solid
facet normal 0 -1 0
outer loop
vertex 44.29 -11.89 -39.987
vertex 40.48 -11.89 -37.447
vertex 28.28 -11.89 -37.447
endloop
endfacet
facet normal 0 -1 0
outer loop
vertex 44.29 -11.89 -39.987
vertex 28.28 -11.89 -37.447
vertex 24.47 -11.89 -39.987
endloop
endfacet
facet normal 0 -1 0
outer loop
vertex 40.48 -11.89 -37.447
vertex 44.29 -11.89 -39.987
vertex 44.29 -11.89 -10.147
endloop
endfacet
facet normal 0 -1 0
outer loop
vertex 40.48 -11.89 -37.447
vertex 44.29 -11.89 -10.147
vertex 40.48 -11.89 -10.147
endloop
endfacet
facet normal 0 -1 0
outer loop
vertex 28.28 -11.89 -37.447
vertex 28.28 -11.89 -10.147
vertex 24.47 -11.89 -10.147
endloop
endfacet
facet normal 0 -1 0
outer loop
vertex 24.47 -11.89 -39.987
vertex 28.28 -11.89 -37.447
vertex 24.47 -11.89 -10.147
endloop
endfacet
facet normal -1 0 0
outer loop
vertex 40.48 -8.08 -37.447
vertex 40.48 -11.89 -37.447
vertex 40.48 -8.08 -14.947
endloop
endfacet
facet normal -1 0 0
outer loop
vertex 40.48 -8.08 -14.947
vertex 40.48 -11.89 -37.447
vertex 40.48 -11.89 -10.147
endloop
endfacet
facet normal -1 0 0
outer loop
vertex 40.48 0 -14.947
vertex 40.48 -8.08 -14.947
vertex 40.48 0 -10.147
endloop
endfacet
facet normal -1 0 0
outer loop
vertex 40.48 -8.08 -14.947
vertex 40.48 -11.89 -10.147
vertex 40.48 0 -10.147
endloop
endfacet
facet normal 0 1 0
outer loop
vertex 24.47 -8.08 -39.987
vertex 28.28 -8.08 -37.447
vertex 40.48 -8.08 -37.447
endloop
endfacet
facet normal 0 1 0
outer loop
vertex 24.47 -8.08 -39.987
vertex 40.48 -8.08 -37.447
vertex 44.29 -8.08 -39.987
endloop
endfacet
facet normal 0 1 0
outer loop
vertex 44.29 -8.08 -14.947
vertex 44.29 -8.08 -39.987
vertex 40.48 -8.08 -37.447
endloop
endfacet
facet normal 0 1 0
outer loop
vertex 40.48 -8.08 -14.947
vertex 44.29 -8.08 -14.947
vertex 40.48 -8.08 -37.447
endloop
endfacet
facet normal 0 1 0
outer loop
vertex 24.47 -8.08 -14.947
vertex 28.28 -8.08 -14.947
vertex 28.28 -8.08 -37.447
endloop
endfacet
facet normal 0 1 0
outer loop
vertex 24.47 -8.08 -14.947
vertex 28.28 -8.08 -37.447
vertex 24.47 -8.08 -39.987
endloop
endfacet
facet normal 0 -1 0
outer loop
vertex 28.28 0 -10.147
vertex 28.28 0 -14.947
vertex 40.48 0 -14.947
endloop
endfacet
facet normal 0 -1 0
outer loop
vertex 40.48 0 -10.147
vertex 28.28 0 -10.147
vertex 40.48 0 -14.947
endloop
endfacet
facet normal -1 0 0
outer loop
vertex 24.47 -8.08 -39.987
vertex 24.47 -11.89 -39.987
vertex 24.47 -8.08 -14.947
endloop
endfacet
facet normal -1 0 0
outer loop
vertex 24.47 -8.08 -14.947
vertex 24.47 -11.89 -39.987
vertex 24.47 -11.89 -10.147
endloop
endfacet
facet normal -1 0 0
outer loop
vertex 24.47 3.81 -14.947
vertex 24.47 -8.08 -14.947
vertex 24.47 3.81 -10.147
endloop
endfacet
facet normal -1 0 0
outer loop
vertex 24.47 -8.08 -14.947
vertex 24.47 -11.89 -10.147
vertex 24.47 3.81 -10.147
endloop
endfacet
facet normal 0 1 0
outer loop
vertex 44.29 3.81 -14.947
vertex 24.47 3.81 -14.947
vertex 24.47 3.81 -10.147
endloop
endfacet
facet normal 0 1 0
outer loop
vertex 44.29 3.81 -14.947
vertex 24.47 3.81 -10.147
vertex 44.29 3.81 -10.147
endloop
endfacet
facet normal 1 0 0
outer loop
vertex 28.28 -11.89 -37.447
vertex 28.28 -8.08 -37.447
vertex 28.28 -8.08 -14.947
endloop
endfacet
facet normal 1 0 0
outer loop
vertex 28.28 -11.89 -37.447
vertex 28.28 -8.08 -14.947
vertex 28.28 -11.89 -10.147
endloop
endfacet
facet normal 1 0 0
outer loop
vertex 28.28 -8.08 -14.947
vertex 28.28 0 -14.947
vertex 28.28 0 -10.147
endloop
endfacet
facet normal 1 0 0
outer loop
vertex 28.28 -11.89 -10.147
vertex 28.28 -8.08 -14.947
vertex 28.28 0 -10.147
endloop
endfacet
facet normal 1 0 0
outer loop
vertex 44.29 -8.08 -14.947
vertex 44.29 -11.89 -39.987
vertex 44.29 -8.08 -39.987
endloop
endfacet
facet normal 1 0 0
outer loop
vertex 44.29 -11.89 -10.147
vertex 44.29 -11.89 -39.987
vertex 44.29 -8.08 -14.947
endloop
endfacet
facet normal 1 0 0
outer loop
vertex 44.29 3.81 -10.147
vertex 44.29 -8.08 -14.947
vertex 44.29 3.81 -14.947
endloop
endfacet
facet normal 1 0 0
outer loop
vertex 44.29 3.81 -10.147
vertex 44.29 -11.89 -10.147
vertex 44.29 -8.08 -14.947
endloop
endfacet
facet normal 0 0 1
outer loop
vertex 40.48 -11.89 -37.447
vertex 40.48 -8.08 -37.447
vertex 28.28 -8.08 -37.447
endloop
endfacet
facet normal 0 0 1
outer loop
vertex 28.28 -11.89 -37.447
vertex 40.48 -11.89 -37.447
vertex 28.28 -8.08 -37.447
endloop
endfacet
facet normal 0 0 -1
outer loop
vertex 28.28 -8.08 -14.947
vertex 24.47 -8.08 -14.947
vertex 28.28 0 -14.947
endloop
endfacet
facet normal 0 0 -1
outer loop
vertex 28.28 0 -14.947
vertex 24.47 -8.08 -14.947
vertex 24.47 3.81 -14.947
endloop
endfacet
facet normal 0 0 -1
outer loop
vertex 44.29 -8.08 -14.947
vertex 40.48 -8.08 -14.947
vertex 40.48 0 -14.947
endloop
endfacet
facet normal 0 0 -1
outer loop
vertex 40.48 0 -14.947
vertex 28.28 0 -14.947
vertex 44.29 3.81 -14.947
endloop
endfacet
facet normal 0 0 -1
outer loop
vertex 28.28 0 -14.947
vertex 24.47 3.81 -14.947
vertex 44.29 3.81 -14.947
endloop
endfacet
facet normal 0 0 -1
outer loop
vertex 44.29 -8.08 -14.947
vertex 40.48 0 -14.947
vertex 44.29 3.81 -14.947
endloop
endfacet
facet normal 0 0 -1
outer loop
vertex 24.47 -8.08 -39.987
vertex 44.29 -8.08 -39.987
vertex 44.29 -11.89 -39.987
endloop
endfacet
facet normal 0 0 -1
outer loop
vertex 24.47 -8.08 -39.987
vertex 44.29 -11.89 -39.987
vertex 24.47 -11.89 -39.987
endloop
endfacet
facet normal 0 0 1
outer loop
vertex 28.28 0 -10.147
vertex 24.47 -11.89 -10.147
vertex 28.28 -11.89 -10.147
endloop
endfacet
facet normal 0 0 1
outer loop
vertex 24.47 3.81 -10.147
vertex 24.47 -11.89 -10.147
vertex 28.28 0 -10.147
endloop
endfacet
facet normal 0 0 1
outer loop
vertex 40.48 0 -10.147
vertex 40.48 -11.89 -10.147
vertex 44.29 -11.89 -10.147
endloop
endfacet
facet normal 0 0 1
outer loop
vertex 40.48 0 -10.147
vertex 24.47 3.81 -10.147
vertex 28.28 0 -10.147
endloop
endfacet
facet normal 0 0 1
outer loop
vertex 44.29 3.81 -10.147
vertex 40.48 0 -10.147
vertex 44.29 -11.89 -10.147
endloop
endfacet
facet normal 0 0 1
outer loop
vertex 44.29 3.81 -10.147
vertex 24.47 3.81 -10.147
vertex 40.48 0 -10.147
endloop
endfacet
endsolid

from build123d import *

# Parameters (mm, degrees)
SKETCH1_W           = 19.82
SKETCH1_H           = 4.8
BOSS_EXTRUDE1_DEPTH = 3.81
SKETCH2_W           = 3.81
SKETCH2_H           = 4.8
BOSS_EXTRUDE2_DEPTH = 11.89
SKETCH3_W           = 3.81
SKETCH3_H           = 3.81
BOSS_EXTRUDE3_DEPTH = 22.5
SKETCH4_W           = 19.82
SKETCH4_H           = 3.81
BOSS_EXTRUDE4_DEPTH = 2.54


with BuildPart() as part:
    # Sketch1 → Boss-Extrude1 (new body)
    with BuildSketch(Plane(origin=(0, 0, 0), x_dir=(1, 0, 0), z_dir=(0, 1, 0))):
        with Locations((34.380252927, 12.547082461)):
            Rectangle(SKETCH1_W, SKETCH1_H)
    extrude(amount=BOSS_EXTRUDE1_DEPTH)

    # Sketch2 → Boss-Extrude2 (add)
    with BuildSketch(Plane.XZ):
        with Locations((26.375252927, -12.547082461)):
            Rectangle(SKETCH2_W, SKETCH2_H)
        with Locations((42.385252927, -12.547082461)):
            Rectangle(SKETCH2_W, SKETCH2_H)
    extrude(amount=BOSS_EXTRUDE2_DEPTH)

    # Sketch3 → Boss-Extrude3 (add)
    with BuildSketch(Plane(origin=(0, 0, -14.947082461), x_dir=(-1, 0, 0), z_dir=(0, 0, -1))):
        with Locations((-42.385252927, -9.985)):
            Rectangle(SKETCH3_W, SKETCH3_H)
        with Locations((-26.375252927, -9.985)):
            Rectangle(SKETCH3_W, SKETCH3_H)
    extrude(amount=BOSS_EXTRUDE3_DEPTH)

    # Sketch4 → Boss-Extrude4 (add)
    with BuildSketch(Plane(origin=(0, 0, -37.447082461), x_dir=(-1, 0, 0), z_dir=(0, 0, -1))):
        with Locations((-34.380252927, -9.985)):
            Rectangle(SKETCH4_W, SKETCH4_H)
    extrude(amount=BOSS_EXTRUDE4_DEPTH)


solid = part.part
